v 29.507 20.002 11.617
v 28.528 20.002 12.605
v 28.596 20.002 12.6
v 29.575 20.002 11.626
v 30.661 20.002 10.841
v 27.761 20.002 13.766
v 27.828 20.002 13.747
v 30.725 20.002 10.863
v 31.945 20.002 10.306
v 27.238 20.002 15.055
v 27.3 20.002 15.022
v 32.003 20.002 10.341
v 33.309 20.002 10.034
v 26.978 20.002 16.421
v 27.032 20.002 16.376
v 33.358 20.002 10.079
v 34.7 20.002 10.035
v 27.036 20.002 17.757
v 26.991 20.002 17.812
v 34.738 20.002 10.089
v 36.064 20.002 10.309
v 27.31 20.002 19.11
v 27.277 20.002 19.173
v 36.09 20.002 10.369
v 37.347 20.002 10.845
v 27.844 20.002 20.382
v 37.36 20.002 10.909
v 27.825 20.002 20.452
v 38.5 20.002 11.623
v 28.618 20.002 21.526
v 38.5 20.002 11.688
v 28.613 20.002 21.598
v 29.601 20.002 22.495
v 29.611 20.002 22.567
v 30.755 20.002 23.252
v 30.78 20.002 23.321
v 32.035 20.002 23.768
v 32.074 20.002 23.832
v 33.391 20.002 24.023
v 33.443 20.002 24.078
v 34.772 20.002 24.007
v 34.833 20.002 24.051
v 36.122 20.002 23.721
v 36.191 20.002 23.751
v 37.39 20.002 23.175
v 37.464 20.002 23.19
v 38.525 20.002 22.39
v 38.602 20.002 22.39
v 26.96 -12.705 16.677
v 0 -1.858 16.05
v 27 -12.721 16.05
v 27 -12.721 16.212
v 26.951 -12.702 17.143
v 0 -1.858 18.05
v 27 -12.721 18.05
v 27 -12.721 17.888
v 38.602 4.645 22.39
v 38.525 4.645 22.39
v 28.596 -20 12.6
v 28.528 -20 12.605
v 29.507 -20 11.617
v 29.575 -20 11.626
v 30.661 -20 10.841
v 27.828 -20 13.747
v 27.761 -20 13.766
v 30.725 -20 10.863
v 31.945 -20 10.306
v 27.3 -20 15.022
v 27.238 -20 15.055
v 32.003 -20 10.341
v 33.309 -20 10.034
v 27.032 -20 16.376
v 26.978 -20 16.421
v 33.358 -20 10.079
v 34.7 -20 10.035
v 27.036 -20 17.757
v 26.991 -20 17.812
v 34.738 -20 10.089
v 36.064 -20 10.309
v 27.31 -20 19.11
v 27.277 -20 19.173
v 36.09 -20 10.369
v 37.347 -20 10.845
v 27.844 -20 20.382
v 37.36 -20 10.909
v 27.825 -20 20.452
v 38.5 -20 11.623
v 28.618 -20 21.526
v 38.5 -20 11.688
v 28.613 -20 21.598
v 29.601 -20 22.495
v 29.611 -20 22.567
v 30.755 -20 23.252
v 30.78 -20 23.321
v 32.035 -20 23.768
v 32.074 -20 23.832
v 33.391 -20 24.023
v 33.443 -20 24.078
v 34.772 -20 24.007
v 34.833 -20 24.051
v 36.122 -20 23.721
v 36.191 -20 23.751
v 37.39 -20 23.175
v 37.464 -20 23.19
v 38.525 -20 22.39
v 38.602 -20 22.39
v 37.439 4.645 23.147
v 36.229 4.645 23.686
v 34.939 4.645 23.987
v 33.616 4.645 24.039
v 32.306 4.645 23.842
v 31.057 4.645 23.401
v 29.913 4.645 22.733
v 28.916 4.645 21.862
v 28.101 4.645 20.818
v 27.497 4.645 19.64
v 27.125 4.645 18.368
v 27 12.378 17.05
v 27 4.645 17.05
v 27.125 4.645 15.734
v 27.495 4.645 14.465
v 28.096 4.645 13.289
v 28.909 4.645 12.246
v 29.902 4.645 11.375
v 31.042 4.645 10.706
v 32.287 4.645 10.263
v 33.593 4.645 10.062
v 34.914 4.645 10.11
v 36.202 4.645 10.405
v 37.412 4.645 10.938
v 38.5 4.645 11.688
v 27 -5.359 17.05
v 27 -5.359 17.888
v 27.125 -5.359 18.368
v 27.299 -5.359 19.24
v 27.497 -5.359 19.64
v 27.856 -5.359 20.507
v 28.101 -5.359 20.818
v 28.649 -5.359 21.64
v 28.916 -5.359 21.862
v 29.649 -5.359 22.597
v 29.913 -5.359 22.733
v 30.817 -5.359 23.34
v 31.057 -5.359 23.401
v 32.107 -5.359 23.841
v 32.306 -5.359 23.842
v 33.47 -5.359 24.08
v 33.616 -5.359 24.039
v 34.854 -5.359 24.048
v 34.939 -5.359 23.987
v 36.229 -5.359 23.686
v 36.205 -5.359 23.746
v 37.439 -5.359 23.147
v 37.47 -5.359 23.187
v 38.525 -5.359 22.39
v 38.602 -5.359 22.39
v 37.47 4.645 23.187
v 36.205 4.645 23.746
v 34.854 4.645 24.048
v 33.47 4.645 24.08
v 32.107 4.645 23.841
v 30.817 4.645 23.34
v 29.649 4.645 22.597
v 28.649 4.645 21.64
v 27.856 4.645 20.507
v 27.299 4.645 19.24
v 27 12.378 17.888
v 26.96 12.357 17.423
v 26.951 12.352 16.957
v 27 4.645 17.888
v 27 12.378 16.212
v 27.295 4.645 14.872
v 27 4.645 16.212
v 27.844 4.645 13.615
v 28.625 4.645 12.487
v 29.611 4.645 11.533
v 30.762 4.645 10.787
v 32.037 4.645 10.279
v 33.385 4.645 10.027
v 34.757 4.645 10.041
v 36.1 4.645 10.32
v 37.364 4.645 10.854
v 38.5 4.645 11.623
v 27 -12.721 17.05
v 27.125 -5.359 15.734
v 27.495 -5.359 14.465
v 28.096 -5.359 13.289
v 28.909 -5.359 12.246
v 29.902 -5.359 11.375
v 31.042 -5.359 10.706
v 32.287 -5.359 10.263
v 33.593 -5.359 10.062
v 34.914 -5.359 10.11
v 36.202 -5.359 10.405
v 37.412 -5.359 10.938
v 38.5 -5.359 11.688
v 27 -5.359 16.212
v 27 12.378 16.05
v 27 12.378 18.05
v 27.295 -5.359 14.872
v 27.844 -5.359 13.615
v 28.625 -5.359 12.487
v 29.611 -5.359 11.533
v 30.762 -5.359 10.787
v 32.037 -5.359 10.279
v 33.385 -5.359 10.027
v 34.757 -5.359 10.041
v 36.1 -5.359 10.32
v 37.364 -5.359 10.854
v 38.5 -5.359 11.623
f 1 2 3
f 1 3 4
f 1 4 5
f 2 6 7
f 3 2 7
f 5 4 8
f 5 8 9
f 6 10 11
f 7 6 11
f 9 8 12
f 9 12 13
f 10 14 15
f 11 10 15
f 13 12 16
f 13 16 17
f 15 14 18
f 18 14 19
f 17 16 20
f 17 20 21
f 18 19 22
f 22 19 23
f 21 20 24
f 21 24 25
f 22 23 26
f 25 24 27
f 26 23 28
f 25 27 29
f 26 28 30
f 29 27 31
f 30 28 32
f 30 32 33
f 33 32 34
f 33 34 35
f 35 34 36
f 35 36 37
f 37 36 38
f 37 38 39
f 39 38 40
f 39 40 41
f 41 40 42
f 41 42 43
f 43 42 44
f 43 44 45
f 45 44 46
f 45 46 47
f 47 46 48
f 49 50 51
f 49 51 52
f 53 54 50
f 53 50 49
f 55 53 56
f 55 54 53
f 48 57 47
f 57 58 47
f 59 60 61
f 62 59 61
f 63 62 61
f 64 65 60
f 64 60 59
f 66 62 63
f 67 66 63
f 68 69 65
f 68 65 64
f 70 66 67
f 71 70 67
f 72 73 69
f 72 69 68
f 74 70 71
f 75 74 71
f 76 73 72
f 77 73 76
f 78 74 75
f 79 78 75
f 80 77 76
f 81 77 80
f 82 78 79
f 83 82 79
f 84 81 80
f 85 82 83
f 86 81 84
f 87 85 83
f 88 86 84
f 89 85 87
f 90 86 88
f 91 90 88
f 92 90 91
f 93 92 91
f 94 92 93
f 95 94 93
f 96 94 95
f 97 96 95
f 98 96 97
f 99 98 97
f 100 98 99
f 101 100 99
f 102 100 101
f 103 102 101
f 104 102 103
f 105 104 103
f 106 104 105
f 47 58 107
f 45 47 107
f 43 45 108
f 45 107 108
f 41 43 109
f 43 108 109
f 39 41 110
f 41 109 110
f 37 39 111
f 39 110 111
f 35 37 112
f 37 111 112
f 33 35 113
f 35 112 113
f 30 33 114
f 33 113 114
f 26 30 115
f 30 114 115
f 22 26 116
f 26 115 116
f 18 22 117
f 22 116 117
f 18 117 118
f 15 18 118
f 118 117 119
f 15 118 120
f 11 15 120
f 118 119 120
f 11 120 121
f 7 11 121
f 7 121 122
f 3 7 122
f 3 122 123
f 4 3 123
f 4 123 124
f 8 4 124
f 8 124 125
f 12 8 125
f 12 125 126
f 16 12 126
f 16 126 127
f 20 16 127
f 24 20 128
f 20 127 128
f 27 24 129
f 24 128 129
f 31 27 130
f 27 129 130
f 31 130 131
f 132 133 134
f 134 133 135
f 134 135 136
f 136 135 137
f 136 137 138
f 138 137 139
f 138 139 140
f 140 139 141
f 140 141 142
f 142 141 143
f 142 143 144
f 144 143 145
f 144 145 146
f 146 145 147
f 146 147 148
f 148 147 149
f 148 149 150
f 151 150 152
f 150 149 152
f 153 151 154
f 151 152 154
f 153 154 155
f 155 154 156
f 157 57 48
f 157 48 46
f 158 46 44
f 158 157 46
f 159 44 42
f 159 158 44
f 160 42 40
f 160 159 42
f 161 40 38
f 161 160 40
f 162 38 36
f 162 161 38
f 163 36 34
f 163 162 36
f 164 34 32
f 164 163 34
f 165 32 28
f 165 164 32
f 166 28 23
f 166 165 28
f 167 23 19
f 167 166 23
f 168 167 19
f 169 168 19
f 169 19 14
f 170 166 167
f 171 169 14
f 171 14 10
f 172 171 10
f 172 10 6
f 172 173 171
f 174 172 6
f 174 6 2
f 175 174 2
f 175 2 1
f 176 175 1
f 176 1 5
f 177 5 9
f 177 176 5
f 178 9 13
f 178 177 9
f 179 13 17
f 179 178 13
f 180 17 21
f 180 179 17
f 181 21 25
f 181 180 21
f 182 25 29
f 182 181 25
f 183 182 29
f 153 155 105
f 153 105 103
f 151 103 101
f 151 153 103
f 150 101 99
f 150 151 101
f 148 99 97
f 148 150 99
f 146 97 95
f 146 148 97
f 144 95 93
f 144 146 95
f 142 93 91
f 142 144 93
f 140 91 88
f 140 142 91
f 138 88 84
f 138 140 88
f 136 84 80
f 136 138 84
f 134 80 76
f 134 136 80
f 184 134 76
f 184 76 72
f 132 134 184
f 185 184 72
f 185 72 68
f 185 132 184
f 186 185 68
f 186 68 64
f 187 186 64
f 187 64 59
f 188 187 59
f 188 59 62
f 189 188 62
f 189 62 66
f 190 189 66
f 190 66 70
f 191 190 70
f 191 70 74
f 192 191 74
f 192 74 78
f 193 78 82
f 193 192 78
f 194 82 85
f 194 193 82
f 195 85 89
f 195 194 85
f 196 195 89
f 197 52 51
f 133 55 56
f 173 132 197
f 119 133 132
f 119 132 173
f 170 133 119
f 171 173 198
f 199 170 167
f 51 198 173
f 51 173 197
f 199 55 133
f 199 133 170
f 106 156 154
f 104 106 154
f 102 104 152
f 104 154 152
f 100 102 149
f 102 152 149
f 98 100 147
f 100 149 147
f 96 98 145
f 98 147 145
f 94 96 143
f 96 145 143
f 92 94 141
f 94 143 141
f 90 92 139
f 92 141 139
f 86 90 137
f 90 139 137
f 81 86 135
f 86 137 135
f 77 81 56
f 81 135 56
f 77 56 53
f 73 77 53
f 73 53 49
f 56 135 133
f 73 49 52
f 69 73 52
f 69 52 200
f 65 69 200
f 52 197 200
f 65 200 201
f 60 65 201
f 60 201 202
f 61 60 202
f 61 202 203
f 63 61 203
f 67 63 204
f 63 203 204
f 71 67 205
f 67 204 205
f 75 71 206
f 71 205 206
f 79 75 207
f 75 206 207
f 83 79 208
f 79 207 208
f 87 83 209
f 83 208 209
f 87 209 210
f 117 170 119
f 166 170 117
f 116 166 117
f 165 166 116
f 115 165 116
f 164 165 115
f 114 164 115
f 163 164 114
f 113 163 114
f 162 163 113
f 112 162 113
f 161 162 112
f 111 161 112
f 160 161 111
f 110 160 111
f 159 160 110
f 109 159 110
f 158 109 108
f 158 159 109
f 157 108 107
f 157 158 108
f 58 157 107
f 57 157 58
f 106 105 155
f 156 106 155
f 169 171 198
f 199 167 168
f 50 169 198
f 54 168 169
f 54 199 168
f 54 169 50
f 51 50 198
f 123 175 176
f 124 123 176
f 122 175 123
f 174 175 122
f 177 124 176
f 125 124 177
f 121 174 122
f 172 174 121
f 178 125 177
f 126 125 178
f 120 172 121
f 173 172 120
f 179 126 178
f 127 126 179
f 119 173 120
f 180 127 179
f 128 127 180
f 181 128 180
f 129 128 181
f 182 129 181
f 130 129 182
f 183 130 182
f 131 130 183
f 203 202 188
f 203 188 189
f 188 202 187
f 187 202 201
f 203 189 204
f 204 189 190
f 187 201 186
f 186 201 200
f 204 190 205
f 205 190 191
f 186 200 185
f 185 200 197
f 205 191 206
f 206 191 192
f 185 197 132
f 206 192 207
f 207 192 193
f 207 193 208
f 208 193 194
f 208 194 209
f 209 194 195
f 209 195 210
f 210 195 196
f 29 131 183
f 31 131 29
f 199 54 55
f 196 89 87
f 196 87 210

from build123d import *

# Parameters (mm, degrees)
F1_R      = 7.05
F1_R_2    = 7
F2_DEPTH  = 15.357
F4_R      = 7.05
F4_R_2    = 7
F5_DEPTH  = 14.641
F8_DEPTH  = 1
F10_W     = 43.367601
F10_H     = 10.774177
F11_DEPTH = 25


with BuildPart() as f2:
    # F1 (on offset) → F2 (new body)
    with BuildSketch(Plane.XZ.offset(-4.645)):
        with Locations((34, 17.05)):
            Circle(F1_R)
        with Locations((34, 17.05)):
            Circle(F1_R_2, mode=Mode.SUBTRACT)
    extrude(amount=-F2_DEPTH)



with BuildPart() as f5:
    # F4 (on offset) → F5 (new body)
    with BuildSketch(Plane.XZ.offset(5.359)):
        with Locations((34, 17.05)):
            Circle(F4_R)
        with Locations((34, 17.05)):
            Circle(F4_R_2, mode=Mode.SUBTRACT)
    extrude(amount=F5_DEPTH)


with BuildPart() as f2_1:
    add(f2.part)

    add(f5.part)  # F8 merges F5
    # F7 (on offset) → F8 (join, symmetric)
    with BuildSketch(Plane.XY.offset(17.05)):
        Polygon((27, -12.721453), (27, 12.37814), (0, -1.858111), align=None)
    extrude(amount=F8_DEPTH, both=True)

    # F10 (on offset) → F11 (cut)
    with BuildSketch(Plane.YZ.offset(38.5)):
        with Locations((0.986395, 17.003338)):
            Rectangle(F10_W, F10_H)
    extrude(amount=F11_DEPTH, mode=Mode.SUBTRACT)


solid = f2_1.part
